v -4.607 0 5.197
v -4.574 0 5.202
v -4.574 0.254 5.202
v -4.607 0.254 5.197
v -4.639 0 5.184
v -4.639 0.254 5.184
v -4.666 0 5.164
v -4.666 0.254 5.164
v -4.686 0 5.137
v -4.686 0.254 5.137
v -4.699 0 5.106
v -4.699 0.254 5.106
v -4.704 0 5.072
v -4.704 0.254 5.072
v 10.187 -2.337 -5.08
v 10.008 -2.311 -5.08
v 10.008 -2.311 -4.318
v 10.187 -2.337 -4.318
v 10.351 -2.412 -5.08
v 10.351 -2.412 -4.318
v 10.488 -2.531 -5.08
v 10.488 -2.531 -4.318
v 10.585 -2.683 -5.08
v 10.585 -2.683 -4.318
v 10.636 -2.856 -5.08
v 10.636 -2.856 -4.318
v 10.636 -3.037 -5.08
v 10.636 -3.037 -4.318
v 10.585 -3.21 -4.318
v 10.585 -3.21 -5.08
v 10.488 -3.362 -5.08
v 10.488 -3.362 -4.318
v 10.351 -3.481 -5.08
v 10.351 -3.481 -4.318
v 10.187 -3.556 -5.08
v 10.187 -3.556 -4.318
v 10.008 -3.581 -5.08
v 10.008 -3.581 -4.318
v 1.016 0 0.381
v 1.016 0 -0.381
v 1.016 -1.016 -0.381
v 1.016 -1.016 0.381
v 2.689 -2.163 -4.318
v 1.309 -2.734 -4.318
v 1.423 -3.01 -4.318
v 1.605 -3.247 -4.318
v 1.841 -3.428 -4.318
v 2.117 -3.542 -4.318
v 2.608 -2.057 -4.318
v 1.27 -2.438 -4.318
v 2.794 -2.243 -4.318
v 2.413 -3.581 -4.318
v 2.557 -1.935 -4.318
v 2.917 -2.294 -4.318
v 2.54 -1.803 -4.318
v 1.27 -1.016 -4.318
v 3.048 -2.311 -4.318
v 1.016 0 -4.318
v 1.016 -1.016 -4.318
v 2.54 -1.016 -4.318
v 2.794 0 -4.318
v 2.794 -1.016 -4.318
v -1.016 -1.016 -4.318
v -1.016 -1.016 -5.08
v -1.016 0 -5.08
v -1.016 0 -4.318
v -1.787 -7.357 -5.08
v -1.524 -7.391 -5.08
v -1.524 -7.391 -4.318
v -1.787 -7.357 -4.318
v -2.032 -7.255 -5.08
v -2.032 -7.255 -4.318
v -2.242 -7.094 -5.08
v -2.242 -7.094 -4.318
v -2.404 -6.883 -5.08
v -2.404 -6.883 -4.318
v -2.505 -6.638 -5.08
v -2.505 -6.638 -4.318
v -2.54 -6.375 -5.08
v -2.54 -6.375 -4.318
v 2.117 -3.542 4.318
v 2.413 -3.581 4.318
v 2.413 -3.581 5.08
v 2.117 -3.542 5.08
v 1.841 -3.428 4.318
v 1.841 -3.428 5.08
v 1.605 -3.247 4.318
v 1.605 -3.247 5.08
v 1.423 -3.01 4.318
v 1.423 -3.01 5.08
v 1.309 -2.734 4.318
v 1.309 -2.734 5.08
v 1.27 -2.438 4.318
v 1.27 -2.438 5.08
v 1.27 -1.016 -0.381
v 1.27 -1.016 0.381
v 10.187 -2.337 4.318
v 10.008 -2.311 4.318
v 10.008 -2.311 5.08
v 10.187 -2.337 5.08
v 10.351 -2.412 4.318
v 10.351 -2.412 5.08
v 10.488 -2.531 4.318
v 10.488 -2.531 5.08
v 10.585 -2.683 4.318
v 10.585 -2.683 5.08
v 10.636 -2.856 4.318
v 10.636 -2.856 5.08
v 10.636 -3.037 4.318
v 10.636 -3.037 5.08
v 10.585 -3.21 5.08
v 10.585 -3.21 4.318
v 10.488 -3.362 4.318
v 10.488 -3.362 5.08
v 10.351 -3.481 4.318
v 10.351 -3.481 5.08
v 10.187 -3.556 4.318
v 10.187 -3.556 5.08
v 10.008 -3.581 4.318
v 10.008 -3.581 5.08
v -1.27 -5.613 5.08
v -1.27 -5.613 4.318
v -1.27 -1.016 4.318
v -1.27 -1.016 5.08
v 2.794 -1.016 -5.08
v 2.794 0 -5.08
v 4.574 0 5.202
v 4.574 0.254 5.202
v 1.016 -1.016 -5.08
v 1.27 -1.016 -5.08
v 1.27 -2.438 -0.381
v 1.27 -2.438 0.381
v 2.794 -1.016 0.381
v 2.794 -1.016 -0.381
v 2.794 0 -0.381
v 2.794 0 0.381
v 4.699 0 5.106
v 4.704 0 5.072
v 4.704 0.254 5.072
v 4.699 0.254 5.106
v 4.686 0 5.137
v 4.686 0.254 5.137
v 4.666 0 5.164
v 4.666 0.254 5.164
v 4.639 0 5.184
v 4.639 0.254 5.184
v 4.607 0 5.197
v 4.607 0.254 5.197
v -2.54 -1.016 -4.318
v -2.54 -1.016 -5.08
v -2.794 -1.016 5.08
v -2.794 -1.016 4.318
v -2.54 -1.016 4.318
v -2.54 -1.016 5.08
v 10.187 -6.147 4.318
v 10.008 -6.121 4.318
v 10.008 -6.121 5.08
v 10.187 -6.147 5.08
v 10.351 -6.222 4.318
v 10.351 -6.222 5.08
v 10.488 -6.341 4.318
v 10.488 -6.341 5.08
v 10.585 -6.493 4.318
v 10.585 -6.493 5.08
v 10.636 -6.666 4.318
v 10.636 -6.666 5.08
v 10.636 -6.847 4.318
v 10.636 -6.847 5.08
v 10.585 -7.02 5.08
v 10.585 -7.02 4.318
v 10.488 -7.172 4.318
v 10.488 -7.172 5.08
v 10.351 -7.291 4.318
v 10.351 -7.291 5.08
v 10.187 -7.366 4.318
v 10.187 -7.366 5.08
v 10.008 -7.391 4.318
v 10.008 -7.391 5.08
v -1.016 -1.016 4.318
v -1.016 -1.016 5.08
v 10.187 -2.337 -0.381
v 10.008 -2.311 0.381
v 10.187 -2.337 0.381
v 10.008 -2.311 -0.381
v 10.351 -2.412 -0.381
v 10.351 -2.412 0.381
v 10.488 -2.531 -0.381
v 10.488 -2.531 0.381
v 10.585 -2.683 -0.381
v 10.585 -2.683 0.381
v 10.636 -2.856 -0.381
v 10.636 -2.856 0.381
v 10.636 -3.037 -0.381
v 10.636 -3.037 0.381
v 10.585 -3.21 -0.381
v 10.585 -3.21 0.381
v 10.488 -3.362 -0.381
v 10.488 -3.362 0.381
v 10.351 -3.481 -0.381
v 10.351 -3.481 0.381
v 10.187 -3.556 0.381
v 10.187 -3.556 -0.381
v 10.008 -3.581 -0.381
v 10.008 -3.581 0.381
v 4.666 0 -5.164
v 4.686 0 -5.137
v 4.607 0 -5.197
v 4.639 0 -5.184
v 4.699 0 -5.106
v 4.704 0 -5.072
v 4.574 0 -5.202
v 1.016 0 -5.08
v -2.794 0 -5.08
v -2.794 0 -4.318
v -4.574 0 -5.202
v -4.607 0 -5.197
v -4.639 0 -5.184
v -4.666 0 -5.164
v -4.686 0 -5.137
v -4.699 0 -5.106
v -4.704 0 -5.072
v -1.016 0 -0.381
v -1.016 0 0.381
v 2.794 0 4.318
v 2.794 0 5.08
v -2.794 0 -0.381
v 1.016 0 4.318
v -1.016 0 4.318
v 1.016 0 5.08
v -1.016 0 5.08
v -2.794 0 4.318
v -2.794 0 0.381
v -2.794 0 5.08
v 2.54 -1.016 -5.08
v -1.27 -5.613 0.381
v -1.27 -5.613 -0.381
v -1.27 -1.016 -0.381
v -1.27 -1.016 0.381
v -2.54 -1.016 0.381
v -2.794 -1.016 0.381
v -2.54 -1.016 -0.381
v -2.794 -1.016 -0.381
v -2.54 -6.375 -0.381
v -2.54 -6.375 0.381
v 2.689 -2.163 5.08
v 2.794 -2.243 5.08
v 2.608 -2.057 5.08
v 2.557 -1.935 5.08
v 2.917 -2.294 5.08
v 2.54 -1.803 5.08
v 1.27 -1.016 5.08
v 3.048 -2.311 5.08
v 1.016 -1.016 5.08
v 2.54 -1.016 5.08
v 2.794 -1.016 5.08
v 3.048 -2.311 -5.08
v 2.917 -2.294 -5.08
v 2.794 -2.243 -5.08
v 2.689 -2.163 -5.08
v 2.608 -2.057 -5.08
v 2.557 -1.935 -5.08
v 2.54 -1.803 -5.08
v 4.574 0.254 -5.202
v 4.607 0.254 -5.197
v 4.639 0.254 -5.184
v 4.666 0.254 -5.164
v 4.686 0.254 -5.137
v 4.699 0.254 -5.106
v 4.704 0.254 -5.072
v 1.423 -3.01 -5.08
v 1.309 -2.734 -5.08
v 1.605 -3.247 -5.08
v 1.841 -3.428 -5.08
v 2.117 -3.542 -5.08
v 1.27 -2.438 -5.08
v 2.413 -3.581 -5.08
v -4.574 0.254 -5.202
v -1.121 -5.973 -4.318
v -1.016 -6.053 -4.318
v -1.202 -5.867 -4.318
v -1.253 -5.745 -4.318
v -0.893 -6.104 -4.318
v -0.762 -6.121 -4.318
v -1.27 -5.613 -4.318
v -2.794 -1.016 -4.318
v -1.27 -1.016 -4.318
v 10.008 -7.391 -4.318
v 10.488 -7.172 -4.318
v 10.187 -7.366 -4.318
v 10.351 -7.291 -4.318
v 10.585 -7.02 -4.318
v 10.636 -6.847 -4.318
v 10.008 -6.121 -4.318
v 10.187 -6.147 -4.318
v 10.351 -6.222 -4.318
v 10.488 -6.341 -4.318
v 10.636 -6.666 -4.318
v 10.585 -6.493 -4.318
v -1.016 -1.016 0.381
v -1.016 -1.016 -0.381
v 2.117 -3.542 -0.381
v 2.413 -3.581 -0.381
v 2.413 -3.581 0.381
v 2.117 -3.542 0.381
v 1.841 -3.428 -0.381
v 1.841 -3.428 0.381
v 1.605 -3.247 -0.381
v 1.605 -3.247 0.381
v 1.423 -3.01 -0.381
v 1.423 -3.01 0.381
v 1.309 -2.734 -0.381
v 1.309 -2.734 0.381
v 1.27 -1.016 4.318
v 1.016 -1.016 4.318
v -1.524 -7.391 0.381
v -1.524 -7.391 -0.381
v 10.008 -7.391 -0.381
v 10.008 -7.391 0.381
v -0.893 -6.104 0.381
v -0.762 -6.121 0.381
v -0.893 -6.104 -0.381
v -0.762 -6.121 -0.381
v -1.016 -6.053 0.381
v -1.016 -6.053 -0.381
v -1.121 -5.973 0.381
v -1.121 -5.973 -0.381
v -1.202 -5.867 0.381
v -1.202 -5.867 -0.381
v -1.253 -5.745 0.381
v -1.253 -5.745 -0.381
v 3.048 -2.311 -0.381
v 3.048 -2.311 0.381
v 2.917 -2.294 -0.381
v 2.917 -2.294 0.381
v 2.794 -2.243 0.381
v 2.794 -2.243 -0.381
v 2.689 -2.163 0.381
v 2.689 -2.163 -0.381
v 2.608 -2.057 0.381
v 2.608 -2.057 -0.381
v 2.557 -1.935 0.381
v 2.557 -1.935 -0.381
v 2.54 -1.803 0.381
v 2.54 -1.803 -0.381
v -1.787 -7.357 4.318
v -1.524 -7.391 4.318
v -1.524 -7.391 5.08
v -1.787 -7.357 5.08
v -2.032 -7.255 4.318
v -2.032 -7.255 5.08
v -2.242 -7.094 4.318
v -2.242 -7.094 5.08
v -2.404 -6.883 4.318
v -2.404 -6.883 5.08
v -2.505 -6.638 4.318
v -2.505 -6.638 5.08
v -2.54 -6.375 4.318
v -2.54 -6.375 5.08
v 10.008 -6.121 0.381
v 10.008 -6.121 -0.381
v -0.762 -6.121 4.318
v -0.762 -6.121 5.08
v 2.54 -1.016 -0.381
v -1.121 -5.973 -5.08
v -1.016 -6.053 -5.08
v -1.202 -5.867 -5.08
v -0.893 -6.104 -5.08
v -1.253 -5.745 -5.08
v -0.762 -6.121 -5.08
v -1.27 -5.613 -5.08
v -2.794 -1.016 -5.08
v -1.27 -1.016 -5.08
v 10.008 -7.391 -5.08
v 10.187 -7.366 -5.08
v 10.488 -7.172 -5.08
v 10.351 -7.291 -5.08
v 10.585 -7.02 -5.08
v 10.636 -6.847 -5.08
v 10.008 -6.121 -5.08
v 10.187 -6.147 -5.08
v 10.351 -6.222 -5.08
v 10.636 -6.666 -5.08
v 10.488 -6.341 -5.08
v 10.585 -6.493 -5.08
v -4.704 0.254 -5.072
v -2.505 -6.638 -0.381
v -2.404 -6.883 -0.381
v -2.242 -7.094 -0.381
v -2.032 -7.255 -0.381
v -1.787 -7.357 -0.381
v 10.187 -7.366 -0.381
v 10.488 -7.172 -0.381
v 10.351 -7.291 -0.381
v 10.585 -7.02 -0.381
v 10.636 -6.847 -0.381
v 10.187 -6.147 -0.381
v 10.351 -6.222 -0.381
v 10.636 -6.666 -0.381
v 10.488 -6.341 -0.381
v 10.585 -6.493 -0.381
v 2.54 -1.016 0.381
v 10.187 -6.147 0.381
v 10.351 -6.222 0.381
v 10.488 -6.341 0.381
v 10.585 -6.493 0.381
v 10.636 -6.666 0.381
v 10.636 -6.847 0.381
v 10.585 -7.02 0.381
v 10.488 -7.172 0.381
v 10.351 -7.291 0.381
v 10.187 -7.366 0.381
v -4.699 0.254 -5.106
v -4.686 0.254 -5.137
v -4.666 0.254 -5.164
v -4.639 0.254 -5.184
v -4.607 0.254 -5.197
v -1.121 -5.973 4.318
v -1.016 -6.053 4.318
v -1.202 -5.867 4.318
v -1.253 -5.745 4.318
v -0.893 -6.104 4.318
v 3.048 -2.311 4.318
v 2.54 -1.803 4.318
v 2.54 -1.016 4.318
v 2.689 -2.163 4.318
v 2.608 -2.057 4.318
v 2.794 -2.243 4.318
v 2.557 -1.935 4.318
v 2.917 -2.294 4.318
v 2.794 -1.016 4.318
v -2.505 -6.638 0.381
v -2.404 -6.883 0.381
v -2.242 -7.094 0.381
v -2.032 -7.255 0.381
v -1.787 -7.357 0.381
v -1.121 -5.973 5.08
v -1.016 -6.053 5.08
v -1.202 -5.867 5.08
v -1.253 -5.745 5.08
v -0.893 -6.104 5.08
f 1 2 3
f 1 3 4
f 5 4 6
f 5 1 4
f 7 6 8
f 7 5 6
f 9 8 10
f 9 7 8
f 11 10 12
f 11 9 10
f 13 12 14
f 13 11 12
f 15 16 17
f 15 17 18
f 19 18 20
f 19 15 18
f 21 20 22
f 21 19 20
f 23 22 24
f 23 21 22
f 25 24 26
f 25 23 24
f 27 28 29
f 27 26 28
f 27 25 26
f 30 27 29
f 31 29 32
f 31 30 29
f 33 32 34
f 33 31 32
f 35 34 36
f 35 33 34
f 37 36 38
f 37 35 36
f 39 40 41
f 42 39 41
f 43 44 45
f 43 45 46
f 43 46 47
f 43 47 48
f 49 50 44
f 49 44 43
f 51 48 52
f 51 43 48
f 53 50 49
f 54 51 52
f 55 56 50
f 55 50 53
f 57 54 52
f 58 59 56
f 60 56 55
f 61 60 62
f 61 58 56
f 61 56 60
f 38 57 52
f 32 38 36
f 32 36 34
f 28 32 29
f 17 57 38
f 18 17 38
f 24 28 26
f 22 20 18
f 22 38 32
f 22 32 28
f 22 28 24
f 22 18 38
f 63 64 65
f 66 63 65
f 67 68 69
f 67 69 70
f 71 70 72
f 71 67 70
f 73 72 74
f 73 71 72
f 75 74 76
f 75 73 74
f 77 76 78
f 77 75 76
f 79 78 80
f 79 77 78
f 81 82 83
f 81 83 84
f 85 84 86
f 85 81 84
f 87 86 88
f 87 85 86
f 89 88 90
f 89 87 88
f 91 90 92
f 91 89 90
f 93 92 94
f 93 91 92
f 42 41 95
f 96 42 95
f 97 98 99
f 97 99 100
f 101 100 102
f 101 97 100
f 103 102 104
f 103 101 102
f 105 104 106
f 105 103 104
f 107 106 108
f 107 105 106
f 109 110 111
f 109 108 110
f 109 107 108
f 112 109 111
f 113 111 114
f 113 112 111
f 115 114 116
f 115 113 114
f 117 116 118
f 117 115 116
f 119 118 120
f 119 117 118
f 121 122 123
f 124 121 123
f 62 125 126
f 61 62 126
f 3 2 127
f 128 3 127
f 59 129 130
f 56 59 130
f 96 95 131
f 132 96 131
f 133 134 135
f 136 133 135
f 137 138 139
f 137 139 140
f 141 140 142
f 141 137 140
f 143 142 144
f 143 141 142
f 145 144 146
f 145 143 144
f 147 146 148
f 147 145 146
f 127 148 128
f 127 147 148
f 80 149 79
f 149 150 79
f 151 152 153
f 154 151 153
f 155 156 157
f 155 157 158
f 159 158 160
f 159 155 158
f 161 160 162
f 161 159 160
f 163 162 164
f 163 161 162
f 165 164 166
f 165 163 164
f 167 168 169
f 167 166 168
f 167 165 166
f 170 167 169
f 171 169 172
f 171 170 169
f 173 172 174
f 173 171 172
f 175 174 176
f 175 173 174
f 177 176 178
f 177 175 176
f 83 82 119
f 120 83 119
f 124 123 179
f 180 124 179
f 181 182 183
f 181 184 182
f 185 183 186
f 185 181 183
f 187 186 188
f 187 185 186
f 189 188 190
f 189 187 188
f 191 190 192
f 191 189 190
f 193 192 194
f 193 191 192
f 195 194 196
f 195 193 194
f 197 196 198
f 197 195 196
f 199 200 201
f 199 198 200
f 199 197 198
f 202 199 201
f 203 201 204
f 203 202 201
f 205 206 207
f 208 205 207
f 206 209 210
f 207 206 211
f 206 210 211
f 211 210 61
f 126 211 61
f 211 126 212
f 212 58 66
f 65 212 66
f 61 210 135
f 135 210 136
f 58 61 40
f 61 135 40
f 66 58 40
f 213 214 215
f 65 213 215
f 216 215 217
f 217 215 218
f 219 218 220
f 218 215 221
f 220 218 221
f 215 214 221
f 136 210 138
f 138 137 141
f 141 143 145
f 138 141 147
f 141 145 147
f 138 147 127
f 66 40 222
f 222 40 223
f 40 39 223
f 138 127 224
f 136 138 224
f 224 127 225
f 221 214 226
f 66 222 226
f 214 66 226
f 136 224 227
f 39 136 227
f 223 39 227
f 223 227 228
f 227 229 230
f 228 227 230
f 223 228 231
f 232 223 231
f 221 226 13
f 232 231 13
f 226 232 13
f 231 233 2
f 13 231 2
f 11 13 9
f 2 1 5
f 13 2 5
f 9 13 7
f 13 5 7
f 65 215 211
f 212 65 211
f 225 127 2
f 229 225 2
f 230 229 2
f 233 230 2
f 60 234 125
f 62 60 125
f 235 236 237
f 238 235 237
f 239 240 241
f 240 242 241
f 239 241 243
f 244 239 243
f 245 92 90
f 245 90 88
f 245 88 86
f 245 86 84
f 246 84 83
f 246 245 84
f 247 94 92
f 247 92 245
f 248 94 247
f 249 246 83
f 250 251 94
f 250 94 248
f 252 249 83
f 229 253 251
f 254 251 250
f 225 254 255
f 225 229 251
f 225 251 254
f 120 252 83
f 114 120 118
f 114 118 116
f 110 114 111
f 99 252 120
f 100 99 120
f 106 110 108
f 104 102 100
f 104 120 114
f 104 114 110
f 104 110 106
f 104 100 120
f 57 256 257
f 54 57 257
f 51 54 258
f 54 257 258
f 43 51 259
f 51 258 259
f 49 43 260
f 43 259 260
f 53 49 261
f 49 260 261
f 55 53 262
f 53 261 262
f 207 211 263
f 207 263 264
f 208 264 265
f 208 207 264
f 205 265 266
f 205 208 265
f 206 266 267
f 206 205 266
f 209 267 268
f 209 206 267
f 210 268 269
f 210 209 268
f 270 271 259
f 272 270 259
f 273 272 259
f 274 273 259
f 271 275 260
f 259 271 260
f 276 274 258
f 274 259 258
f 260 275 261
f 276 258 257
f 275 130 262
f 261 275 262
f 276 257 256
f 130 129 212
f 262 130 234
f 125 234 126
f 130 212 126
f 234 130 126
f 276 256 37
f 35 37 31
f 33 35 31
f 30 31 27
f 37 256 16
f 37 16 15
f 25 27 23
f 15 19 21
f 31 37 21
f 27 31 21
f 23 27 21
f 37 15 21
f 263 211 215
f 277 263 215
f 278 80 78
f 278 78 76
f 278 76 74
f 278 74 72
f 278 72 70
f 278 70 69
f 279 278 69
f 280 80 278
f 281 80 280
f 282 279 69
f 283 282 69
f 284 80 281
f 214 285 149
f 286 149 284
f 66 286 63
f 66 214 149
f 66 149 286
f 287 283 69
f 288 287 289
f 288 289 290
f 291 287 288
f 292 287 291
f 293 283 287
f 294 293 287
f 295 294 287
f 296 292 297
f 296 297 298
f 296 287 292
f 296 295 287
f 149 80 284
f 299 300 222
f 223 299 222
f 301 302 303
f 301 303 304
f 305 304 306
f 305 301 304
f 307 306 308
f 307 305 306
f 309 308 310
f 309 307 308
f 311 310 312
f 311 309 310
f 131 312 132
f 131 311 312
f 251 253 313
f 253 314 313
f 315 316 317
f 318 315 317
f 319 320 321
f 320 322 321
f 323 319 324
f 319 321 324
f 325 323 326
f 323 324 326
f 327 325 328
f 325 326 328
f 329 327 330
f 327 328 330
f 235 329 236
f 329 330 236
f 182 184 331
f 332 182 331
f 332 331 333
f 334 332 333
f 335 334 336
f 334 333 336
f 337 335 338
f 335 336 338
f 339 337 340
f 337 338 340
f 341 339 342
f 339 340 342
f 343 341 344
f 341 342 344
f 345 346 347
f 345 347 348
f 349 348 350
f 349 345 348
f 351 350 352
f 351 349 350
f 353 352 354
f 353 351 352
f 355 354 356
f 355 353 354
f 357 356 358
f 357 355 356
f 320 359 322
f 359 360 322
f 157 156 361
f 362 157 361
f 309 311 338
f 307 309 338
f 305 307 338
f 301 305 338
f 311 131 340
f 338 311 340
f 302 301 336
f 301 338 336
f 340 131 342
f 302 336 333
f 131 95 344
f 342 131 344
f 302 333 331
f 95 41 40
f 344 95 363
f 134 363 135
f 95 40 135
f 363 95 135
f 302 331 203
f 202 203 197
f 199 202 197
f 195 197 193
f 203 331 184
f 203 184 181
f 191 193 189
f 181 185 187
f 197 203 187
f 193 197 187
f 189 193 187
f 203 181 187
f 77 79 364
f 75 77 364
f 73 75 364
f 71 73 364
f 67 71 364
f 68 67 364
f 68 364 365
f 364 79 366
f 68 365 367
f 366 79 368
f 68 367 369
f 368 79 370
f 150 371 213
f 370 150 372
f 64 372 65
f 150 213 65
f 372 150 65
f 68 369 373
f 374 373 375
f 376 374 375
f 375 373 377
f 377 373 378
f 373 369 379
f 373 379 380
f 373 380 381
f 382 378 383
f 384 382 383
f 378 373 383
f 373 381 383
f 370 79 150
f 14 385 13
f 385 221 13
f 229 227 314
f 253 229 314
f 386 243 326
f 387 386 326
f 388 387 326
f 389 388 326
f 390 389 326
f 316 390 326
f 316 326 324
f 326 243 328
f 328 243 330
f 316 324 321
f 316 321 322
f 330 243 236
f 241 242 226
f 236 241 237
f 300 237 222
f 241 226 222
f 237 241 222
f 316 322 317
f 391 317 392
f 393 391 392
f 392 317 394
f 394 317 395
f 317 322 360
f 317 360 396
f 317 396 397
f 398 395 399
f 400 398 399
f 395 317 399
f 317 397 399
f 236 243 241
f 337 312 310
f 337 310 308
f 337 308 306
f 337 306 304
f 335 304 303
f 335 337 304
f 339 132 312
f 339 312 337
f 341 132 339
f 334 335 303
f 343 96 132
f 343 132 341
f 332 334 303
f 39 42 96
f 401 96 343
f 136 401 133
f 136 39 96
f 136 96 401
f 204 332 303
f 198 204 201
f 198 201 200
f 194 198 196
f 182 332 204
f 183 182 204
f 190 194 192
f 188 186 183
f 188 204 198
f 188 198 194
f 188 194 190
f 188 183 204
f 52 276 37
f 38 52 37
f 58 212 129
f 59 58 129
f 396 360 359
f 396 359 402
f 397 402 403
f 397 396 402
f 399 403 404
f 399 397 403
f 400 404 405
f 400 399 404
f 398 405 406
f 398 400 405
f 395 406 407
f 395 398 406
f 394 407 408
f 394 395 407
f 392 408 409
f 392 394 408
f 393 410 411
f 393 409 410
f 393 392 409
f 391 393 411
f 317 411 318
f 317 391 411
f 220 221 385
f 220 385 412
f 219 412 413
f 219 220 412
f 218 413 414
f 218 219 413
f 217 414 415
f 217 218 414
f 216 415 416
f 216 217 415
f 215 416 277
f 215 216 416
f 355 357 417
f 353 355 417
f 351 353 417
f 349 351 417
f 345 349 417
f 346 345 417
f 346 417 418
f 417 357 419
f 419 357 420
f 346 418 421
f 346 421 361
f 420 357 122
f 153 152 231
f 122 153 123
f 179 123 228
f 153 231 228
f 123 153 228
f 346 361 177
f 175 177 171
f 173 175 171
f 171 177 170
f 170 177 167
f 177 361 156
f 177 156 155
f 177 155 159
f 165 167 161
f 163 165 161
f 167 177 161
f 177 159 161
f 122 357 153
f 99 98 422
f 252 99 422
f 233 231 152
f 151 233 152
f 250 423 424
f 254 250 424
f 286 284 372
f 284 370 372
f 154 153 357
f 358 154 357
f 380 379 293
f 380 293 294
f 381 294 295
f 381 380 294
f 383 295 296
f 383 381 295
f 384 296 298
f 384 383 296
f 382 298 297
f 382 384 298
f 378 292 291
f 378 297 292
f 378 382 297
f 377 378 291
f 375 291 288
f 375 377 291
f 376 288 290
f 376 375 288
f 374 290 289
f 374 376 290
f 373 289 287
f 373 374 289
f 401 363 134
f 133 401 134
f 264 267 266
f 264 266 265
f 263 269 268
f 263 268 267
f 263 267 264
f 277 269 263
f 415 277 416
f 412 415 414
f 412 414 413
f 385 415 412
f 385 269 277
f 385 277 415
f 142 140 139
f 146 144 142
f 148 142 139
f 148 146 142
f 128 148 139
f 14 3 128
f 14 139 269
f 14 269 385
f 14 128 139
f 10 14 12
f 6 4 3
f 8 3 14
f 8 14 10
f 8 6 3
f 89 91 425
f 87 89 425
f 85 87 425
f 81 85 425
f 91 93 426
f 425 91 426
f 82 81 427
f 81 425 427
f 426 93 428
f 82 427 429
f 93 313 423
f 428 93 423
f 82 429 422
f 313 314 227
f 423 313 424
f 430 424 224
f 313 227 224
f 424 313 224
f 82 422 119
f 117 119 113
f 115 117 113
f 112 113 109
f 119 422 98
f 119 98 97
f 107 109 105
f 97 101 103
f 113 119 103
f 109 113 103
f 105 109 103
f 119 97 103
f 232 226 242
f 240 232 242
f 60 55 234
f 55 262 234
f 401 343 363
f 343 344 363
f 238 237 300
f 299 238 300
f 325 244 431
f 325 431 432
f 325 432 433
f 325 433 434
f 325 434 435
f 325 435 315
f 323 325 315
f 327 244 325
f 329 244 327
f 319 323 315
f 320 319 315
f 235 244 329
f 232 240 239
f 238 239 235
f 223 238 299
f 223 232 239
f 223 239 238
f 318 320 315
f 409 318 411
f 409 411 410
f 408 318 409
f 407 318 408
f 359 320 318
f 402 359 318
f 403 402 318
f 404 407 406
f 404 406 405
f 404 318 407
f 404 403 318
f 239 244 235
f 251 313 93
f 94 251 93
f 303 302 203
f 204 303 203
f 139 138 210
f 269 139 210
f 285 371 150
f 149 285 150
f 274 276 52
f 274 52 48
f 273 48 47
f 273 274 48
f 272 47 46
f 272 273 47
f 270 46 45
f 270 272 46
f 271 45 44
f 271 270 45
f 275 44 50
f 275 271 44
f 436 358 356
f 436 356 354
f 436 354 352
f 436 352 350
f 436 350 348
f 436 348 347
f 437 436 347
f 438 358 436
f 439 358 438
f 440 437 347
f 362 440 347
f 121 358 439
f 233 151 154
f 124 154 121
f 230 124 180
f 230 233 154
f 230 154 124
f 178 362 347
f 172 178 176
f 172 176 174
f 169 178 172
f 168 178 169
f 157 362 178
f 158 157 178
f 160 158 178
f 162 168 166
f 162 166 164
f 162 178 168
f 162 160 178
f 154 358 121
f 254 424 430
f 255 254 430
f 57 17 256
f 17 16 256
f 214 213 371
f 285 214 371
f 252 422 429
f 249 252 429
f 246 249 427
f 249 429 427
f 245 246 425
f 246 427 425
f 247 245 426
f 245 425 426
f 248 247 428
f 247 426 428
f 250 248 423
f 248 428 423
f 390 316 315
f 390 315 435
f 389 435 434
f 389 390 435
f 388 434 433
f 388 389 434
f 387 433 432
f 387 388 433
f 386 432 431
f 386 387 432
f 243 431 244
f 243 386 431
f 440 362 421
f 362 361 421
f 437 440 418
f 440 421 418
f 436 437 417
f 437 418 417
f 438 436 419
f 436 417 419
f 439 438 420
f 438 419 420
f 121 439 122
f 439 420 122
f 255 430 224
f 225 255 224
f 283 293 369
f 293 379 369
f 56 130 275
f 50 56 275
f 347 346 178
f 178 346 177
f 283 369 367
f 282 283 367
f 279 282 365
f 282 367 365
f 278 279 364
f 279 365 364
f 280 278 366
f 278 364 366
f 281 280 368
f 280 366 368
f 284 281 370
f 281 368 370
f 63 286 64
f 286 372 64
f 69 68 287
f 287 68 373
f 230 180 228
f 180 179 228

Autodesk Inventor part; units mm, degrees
sketch "Sketch_2" plane through (0, 0, 0) normal (0, 1, 0) x (-1, 0, 0)
  line L0 (4.7037, -5.0719) -> (4.7037, 5.0719)
  arc A0 (4.7037, 5.0719) -> (4.5737, 5.2019) centre (4.5737, 5.0719) ccw
  line L1 (4.5737, 5.2019) -> (-4.5737, 5.2019)
  arc A1 (-4.5737, 5.2019) -> (-4.7037, 5.0719) centre (-4.5737, 5.0719) ccw
  line L2 (-4.7037, 5.0719) -> (-4.7037, -5.0719)
  arc A2 (-4.7037, -5.0719) -> (-4.5737, -5.2019) centre (-4.5737, -5.0719) ccw
  line L3 (-4.5737, -5.2019) -> (4.5737, -5.2019)
  arc A3 (4.5737, -5.2019) -> (4.7037, -5.0719) centre (4.5737, -5.0719) ccw
extrude "Extrusion1" add sketch "Sketch_2" along normal blind 0.254
sketch "Sketch_1" plane through (0, 0, -4.699) normal (0, 0, 1) x (1, 0, 0)
  line L0 (1.016, 0) -> (1.016, -1.016)
  line L1 (1.016, -1.016) -> (1.27, -1.016)
  line L2 (1.27, -1.016) -> (1.27, -2.4384)
  arc A0 (1.27, -2.4384) -> (2.413, -3.5814) centre (2.413, -2.4384) ccw
  line L3 (2.413, -3.5814) -> (10.0076, -3.5814)
  arc A1 (10.0076, -3.5814) -> (10.0076, -2.3114) centre (10.0076, -2.9464) ccw
  line L4 (10.0076, -2.3114) -> (3.048, -2.3114)
  arc A2 (2.54, -1.8034) -> (3.048, -2.3114) centre (3.048, -1.8034) ccw
  line L5 (2.54, -1.8034) -> (2.54, -1.016)
  line L6 (2.54, -1.016) -> (2.794, -1.016)
  line L7 (2.794, -1.016) -> (2.794, 0)
  line L8 (2.794, 0) -> (1.016, 0)
extrude "Extrusion2" add sketch "Sketch_1" along normal mid plane 0.762
pattern_linear "Rectangular Pattern1" count 3 spacing 4.699 along (0, 0, 1) of "Extrusion2"
sketch "Sketch_18" plane through (0, 0, -4.699) normal (0, 0, 1) x (1, 0, 0)
  line L0 (-2.794, 0) -> (-2.794, -1.016)
  line L1 (-2.794, -1.016) -> (-2.54, -1.016)
  line L2 (-2.54, -1.016) -> (-2.54, -6.3754)
  arc A0 (-2.54, -6.3754) -> (-1.524, -7.3914) centre (-1.524, -6.3754) ccw
  line L3 (-1.524, -7.3914) -> (10.0076, -7.3914)
  arc A1 (10.0076, -7.3914) -> (10.0076, -6.1214) centre (10.0076, -6.7564) ccw
  line L4 (10.0076, -6.1214) -> (-0.762, -6.1214)
  arc A2 (-1.27, -5.6134) -> (-0.762, -6.1214) centre (-0.762, -5.6134) ccw
  line L5 (-1.27, -5.6134) -> (-1.27, -1.016)
  line L6 (-1.27, -1.016) -> (-1.016, -1.016)
  line L7 (-1.016, -1.016) -> (-1.016, 0)
  line L8 (-1.016, 0) -> (-2.794, 0)
extrude "Extrusion3" add sketch "Sketch_18" along normal mid plane 0.762
pattern_linear "Rectangular Pattern2" count 3 spacing 4.699 along (0, 0, 1) of "Extrusion3"
ref_plane "to_base_XY" through (0, -0.0254, 0) normal (0, 1, 0) x (1, 0, 0)
ref_plane "to_base_YZ" through (0, -0.0254, 0) normal (1, 0, 0) x (0, 0, -1)
ref_plane "to_base_ZX" through (0, -0.0254, 0) normal (0, 0, -1) x (0, 1, 0)
properties part number "M202830_terminal_angW"
